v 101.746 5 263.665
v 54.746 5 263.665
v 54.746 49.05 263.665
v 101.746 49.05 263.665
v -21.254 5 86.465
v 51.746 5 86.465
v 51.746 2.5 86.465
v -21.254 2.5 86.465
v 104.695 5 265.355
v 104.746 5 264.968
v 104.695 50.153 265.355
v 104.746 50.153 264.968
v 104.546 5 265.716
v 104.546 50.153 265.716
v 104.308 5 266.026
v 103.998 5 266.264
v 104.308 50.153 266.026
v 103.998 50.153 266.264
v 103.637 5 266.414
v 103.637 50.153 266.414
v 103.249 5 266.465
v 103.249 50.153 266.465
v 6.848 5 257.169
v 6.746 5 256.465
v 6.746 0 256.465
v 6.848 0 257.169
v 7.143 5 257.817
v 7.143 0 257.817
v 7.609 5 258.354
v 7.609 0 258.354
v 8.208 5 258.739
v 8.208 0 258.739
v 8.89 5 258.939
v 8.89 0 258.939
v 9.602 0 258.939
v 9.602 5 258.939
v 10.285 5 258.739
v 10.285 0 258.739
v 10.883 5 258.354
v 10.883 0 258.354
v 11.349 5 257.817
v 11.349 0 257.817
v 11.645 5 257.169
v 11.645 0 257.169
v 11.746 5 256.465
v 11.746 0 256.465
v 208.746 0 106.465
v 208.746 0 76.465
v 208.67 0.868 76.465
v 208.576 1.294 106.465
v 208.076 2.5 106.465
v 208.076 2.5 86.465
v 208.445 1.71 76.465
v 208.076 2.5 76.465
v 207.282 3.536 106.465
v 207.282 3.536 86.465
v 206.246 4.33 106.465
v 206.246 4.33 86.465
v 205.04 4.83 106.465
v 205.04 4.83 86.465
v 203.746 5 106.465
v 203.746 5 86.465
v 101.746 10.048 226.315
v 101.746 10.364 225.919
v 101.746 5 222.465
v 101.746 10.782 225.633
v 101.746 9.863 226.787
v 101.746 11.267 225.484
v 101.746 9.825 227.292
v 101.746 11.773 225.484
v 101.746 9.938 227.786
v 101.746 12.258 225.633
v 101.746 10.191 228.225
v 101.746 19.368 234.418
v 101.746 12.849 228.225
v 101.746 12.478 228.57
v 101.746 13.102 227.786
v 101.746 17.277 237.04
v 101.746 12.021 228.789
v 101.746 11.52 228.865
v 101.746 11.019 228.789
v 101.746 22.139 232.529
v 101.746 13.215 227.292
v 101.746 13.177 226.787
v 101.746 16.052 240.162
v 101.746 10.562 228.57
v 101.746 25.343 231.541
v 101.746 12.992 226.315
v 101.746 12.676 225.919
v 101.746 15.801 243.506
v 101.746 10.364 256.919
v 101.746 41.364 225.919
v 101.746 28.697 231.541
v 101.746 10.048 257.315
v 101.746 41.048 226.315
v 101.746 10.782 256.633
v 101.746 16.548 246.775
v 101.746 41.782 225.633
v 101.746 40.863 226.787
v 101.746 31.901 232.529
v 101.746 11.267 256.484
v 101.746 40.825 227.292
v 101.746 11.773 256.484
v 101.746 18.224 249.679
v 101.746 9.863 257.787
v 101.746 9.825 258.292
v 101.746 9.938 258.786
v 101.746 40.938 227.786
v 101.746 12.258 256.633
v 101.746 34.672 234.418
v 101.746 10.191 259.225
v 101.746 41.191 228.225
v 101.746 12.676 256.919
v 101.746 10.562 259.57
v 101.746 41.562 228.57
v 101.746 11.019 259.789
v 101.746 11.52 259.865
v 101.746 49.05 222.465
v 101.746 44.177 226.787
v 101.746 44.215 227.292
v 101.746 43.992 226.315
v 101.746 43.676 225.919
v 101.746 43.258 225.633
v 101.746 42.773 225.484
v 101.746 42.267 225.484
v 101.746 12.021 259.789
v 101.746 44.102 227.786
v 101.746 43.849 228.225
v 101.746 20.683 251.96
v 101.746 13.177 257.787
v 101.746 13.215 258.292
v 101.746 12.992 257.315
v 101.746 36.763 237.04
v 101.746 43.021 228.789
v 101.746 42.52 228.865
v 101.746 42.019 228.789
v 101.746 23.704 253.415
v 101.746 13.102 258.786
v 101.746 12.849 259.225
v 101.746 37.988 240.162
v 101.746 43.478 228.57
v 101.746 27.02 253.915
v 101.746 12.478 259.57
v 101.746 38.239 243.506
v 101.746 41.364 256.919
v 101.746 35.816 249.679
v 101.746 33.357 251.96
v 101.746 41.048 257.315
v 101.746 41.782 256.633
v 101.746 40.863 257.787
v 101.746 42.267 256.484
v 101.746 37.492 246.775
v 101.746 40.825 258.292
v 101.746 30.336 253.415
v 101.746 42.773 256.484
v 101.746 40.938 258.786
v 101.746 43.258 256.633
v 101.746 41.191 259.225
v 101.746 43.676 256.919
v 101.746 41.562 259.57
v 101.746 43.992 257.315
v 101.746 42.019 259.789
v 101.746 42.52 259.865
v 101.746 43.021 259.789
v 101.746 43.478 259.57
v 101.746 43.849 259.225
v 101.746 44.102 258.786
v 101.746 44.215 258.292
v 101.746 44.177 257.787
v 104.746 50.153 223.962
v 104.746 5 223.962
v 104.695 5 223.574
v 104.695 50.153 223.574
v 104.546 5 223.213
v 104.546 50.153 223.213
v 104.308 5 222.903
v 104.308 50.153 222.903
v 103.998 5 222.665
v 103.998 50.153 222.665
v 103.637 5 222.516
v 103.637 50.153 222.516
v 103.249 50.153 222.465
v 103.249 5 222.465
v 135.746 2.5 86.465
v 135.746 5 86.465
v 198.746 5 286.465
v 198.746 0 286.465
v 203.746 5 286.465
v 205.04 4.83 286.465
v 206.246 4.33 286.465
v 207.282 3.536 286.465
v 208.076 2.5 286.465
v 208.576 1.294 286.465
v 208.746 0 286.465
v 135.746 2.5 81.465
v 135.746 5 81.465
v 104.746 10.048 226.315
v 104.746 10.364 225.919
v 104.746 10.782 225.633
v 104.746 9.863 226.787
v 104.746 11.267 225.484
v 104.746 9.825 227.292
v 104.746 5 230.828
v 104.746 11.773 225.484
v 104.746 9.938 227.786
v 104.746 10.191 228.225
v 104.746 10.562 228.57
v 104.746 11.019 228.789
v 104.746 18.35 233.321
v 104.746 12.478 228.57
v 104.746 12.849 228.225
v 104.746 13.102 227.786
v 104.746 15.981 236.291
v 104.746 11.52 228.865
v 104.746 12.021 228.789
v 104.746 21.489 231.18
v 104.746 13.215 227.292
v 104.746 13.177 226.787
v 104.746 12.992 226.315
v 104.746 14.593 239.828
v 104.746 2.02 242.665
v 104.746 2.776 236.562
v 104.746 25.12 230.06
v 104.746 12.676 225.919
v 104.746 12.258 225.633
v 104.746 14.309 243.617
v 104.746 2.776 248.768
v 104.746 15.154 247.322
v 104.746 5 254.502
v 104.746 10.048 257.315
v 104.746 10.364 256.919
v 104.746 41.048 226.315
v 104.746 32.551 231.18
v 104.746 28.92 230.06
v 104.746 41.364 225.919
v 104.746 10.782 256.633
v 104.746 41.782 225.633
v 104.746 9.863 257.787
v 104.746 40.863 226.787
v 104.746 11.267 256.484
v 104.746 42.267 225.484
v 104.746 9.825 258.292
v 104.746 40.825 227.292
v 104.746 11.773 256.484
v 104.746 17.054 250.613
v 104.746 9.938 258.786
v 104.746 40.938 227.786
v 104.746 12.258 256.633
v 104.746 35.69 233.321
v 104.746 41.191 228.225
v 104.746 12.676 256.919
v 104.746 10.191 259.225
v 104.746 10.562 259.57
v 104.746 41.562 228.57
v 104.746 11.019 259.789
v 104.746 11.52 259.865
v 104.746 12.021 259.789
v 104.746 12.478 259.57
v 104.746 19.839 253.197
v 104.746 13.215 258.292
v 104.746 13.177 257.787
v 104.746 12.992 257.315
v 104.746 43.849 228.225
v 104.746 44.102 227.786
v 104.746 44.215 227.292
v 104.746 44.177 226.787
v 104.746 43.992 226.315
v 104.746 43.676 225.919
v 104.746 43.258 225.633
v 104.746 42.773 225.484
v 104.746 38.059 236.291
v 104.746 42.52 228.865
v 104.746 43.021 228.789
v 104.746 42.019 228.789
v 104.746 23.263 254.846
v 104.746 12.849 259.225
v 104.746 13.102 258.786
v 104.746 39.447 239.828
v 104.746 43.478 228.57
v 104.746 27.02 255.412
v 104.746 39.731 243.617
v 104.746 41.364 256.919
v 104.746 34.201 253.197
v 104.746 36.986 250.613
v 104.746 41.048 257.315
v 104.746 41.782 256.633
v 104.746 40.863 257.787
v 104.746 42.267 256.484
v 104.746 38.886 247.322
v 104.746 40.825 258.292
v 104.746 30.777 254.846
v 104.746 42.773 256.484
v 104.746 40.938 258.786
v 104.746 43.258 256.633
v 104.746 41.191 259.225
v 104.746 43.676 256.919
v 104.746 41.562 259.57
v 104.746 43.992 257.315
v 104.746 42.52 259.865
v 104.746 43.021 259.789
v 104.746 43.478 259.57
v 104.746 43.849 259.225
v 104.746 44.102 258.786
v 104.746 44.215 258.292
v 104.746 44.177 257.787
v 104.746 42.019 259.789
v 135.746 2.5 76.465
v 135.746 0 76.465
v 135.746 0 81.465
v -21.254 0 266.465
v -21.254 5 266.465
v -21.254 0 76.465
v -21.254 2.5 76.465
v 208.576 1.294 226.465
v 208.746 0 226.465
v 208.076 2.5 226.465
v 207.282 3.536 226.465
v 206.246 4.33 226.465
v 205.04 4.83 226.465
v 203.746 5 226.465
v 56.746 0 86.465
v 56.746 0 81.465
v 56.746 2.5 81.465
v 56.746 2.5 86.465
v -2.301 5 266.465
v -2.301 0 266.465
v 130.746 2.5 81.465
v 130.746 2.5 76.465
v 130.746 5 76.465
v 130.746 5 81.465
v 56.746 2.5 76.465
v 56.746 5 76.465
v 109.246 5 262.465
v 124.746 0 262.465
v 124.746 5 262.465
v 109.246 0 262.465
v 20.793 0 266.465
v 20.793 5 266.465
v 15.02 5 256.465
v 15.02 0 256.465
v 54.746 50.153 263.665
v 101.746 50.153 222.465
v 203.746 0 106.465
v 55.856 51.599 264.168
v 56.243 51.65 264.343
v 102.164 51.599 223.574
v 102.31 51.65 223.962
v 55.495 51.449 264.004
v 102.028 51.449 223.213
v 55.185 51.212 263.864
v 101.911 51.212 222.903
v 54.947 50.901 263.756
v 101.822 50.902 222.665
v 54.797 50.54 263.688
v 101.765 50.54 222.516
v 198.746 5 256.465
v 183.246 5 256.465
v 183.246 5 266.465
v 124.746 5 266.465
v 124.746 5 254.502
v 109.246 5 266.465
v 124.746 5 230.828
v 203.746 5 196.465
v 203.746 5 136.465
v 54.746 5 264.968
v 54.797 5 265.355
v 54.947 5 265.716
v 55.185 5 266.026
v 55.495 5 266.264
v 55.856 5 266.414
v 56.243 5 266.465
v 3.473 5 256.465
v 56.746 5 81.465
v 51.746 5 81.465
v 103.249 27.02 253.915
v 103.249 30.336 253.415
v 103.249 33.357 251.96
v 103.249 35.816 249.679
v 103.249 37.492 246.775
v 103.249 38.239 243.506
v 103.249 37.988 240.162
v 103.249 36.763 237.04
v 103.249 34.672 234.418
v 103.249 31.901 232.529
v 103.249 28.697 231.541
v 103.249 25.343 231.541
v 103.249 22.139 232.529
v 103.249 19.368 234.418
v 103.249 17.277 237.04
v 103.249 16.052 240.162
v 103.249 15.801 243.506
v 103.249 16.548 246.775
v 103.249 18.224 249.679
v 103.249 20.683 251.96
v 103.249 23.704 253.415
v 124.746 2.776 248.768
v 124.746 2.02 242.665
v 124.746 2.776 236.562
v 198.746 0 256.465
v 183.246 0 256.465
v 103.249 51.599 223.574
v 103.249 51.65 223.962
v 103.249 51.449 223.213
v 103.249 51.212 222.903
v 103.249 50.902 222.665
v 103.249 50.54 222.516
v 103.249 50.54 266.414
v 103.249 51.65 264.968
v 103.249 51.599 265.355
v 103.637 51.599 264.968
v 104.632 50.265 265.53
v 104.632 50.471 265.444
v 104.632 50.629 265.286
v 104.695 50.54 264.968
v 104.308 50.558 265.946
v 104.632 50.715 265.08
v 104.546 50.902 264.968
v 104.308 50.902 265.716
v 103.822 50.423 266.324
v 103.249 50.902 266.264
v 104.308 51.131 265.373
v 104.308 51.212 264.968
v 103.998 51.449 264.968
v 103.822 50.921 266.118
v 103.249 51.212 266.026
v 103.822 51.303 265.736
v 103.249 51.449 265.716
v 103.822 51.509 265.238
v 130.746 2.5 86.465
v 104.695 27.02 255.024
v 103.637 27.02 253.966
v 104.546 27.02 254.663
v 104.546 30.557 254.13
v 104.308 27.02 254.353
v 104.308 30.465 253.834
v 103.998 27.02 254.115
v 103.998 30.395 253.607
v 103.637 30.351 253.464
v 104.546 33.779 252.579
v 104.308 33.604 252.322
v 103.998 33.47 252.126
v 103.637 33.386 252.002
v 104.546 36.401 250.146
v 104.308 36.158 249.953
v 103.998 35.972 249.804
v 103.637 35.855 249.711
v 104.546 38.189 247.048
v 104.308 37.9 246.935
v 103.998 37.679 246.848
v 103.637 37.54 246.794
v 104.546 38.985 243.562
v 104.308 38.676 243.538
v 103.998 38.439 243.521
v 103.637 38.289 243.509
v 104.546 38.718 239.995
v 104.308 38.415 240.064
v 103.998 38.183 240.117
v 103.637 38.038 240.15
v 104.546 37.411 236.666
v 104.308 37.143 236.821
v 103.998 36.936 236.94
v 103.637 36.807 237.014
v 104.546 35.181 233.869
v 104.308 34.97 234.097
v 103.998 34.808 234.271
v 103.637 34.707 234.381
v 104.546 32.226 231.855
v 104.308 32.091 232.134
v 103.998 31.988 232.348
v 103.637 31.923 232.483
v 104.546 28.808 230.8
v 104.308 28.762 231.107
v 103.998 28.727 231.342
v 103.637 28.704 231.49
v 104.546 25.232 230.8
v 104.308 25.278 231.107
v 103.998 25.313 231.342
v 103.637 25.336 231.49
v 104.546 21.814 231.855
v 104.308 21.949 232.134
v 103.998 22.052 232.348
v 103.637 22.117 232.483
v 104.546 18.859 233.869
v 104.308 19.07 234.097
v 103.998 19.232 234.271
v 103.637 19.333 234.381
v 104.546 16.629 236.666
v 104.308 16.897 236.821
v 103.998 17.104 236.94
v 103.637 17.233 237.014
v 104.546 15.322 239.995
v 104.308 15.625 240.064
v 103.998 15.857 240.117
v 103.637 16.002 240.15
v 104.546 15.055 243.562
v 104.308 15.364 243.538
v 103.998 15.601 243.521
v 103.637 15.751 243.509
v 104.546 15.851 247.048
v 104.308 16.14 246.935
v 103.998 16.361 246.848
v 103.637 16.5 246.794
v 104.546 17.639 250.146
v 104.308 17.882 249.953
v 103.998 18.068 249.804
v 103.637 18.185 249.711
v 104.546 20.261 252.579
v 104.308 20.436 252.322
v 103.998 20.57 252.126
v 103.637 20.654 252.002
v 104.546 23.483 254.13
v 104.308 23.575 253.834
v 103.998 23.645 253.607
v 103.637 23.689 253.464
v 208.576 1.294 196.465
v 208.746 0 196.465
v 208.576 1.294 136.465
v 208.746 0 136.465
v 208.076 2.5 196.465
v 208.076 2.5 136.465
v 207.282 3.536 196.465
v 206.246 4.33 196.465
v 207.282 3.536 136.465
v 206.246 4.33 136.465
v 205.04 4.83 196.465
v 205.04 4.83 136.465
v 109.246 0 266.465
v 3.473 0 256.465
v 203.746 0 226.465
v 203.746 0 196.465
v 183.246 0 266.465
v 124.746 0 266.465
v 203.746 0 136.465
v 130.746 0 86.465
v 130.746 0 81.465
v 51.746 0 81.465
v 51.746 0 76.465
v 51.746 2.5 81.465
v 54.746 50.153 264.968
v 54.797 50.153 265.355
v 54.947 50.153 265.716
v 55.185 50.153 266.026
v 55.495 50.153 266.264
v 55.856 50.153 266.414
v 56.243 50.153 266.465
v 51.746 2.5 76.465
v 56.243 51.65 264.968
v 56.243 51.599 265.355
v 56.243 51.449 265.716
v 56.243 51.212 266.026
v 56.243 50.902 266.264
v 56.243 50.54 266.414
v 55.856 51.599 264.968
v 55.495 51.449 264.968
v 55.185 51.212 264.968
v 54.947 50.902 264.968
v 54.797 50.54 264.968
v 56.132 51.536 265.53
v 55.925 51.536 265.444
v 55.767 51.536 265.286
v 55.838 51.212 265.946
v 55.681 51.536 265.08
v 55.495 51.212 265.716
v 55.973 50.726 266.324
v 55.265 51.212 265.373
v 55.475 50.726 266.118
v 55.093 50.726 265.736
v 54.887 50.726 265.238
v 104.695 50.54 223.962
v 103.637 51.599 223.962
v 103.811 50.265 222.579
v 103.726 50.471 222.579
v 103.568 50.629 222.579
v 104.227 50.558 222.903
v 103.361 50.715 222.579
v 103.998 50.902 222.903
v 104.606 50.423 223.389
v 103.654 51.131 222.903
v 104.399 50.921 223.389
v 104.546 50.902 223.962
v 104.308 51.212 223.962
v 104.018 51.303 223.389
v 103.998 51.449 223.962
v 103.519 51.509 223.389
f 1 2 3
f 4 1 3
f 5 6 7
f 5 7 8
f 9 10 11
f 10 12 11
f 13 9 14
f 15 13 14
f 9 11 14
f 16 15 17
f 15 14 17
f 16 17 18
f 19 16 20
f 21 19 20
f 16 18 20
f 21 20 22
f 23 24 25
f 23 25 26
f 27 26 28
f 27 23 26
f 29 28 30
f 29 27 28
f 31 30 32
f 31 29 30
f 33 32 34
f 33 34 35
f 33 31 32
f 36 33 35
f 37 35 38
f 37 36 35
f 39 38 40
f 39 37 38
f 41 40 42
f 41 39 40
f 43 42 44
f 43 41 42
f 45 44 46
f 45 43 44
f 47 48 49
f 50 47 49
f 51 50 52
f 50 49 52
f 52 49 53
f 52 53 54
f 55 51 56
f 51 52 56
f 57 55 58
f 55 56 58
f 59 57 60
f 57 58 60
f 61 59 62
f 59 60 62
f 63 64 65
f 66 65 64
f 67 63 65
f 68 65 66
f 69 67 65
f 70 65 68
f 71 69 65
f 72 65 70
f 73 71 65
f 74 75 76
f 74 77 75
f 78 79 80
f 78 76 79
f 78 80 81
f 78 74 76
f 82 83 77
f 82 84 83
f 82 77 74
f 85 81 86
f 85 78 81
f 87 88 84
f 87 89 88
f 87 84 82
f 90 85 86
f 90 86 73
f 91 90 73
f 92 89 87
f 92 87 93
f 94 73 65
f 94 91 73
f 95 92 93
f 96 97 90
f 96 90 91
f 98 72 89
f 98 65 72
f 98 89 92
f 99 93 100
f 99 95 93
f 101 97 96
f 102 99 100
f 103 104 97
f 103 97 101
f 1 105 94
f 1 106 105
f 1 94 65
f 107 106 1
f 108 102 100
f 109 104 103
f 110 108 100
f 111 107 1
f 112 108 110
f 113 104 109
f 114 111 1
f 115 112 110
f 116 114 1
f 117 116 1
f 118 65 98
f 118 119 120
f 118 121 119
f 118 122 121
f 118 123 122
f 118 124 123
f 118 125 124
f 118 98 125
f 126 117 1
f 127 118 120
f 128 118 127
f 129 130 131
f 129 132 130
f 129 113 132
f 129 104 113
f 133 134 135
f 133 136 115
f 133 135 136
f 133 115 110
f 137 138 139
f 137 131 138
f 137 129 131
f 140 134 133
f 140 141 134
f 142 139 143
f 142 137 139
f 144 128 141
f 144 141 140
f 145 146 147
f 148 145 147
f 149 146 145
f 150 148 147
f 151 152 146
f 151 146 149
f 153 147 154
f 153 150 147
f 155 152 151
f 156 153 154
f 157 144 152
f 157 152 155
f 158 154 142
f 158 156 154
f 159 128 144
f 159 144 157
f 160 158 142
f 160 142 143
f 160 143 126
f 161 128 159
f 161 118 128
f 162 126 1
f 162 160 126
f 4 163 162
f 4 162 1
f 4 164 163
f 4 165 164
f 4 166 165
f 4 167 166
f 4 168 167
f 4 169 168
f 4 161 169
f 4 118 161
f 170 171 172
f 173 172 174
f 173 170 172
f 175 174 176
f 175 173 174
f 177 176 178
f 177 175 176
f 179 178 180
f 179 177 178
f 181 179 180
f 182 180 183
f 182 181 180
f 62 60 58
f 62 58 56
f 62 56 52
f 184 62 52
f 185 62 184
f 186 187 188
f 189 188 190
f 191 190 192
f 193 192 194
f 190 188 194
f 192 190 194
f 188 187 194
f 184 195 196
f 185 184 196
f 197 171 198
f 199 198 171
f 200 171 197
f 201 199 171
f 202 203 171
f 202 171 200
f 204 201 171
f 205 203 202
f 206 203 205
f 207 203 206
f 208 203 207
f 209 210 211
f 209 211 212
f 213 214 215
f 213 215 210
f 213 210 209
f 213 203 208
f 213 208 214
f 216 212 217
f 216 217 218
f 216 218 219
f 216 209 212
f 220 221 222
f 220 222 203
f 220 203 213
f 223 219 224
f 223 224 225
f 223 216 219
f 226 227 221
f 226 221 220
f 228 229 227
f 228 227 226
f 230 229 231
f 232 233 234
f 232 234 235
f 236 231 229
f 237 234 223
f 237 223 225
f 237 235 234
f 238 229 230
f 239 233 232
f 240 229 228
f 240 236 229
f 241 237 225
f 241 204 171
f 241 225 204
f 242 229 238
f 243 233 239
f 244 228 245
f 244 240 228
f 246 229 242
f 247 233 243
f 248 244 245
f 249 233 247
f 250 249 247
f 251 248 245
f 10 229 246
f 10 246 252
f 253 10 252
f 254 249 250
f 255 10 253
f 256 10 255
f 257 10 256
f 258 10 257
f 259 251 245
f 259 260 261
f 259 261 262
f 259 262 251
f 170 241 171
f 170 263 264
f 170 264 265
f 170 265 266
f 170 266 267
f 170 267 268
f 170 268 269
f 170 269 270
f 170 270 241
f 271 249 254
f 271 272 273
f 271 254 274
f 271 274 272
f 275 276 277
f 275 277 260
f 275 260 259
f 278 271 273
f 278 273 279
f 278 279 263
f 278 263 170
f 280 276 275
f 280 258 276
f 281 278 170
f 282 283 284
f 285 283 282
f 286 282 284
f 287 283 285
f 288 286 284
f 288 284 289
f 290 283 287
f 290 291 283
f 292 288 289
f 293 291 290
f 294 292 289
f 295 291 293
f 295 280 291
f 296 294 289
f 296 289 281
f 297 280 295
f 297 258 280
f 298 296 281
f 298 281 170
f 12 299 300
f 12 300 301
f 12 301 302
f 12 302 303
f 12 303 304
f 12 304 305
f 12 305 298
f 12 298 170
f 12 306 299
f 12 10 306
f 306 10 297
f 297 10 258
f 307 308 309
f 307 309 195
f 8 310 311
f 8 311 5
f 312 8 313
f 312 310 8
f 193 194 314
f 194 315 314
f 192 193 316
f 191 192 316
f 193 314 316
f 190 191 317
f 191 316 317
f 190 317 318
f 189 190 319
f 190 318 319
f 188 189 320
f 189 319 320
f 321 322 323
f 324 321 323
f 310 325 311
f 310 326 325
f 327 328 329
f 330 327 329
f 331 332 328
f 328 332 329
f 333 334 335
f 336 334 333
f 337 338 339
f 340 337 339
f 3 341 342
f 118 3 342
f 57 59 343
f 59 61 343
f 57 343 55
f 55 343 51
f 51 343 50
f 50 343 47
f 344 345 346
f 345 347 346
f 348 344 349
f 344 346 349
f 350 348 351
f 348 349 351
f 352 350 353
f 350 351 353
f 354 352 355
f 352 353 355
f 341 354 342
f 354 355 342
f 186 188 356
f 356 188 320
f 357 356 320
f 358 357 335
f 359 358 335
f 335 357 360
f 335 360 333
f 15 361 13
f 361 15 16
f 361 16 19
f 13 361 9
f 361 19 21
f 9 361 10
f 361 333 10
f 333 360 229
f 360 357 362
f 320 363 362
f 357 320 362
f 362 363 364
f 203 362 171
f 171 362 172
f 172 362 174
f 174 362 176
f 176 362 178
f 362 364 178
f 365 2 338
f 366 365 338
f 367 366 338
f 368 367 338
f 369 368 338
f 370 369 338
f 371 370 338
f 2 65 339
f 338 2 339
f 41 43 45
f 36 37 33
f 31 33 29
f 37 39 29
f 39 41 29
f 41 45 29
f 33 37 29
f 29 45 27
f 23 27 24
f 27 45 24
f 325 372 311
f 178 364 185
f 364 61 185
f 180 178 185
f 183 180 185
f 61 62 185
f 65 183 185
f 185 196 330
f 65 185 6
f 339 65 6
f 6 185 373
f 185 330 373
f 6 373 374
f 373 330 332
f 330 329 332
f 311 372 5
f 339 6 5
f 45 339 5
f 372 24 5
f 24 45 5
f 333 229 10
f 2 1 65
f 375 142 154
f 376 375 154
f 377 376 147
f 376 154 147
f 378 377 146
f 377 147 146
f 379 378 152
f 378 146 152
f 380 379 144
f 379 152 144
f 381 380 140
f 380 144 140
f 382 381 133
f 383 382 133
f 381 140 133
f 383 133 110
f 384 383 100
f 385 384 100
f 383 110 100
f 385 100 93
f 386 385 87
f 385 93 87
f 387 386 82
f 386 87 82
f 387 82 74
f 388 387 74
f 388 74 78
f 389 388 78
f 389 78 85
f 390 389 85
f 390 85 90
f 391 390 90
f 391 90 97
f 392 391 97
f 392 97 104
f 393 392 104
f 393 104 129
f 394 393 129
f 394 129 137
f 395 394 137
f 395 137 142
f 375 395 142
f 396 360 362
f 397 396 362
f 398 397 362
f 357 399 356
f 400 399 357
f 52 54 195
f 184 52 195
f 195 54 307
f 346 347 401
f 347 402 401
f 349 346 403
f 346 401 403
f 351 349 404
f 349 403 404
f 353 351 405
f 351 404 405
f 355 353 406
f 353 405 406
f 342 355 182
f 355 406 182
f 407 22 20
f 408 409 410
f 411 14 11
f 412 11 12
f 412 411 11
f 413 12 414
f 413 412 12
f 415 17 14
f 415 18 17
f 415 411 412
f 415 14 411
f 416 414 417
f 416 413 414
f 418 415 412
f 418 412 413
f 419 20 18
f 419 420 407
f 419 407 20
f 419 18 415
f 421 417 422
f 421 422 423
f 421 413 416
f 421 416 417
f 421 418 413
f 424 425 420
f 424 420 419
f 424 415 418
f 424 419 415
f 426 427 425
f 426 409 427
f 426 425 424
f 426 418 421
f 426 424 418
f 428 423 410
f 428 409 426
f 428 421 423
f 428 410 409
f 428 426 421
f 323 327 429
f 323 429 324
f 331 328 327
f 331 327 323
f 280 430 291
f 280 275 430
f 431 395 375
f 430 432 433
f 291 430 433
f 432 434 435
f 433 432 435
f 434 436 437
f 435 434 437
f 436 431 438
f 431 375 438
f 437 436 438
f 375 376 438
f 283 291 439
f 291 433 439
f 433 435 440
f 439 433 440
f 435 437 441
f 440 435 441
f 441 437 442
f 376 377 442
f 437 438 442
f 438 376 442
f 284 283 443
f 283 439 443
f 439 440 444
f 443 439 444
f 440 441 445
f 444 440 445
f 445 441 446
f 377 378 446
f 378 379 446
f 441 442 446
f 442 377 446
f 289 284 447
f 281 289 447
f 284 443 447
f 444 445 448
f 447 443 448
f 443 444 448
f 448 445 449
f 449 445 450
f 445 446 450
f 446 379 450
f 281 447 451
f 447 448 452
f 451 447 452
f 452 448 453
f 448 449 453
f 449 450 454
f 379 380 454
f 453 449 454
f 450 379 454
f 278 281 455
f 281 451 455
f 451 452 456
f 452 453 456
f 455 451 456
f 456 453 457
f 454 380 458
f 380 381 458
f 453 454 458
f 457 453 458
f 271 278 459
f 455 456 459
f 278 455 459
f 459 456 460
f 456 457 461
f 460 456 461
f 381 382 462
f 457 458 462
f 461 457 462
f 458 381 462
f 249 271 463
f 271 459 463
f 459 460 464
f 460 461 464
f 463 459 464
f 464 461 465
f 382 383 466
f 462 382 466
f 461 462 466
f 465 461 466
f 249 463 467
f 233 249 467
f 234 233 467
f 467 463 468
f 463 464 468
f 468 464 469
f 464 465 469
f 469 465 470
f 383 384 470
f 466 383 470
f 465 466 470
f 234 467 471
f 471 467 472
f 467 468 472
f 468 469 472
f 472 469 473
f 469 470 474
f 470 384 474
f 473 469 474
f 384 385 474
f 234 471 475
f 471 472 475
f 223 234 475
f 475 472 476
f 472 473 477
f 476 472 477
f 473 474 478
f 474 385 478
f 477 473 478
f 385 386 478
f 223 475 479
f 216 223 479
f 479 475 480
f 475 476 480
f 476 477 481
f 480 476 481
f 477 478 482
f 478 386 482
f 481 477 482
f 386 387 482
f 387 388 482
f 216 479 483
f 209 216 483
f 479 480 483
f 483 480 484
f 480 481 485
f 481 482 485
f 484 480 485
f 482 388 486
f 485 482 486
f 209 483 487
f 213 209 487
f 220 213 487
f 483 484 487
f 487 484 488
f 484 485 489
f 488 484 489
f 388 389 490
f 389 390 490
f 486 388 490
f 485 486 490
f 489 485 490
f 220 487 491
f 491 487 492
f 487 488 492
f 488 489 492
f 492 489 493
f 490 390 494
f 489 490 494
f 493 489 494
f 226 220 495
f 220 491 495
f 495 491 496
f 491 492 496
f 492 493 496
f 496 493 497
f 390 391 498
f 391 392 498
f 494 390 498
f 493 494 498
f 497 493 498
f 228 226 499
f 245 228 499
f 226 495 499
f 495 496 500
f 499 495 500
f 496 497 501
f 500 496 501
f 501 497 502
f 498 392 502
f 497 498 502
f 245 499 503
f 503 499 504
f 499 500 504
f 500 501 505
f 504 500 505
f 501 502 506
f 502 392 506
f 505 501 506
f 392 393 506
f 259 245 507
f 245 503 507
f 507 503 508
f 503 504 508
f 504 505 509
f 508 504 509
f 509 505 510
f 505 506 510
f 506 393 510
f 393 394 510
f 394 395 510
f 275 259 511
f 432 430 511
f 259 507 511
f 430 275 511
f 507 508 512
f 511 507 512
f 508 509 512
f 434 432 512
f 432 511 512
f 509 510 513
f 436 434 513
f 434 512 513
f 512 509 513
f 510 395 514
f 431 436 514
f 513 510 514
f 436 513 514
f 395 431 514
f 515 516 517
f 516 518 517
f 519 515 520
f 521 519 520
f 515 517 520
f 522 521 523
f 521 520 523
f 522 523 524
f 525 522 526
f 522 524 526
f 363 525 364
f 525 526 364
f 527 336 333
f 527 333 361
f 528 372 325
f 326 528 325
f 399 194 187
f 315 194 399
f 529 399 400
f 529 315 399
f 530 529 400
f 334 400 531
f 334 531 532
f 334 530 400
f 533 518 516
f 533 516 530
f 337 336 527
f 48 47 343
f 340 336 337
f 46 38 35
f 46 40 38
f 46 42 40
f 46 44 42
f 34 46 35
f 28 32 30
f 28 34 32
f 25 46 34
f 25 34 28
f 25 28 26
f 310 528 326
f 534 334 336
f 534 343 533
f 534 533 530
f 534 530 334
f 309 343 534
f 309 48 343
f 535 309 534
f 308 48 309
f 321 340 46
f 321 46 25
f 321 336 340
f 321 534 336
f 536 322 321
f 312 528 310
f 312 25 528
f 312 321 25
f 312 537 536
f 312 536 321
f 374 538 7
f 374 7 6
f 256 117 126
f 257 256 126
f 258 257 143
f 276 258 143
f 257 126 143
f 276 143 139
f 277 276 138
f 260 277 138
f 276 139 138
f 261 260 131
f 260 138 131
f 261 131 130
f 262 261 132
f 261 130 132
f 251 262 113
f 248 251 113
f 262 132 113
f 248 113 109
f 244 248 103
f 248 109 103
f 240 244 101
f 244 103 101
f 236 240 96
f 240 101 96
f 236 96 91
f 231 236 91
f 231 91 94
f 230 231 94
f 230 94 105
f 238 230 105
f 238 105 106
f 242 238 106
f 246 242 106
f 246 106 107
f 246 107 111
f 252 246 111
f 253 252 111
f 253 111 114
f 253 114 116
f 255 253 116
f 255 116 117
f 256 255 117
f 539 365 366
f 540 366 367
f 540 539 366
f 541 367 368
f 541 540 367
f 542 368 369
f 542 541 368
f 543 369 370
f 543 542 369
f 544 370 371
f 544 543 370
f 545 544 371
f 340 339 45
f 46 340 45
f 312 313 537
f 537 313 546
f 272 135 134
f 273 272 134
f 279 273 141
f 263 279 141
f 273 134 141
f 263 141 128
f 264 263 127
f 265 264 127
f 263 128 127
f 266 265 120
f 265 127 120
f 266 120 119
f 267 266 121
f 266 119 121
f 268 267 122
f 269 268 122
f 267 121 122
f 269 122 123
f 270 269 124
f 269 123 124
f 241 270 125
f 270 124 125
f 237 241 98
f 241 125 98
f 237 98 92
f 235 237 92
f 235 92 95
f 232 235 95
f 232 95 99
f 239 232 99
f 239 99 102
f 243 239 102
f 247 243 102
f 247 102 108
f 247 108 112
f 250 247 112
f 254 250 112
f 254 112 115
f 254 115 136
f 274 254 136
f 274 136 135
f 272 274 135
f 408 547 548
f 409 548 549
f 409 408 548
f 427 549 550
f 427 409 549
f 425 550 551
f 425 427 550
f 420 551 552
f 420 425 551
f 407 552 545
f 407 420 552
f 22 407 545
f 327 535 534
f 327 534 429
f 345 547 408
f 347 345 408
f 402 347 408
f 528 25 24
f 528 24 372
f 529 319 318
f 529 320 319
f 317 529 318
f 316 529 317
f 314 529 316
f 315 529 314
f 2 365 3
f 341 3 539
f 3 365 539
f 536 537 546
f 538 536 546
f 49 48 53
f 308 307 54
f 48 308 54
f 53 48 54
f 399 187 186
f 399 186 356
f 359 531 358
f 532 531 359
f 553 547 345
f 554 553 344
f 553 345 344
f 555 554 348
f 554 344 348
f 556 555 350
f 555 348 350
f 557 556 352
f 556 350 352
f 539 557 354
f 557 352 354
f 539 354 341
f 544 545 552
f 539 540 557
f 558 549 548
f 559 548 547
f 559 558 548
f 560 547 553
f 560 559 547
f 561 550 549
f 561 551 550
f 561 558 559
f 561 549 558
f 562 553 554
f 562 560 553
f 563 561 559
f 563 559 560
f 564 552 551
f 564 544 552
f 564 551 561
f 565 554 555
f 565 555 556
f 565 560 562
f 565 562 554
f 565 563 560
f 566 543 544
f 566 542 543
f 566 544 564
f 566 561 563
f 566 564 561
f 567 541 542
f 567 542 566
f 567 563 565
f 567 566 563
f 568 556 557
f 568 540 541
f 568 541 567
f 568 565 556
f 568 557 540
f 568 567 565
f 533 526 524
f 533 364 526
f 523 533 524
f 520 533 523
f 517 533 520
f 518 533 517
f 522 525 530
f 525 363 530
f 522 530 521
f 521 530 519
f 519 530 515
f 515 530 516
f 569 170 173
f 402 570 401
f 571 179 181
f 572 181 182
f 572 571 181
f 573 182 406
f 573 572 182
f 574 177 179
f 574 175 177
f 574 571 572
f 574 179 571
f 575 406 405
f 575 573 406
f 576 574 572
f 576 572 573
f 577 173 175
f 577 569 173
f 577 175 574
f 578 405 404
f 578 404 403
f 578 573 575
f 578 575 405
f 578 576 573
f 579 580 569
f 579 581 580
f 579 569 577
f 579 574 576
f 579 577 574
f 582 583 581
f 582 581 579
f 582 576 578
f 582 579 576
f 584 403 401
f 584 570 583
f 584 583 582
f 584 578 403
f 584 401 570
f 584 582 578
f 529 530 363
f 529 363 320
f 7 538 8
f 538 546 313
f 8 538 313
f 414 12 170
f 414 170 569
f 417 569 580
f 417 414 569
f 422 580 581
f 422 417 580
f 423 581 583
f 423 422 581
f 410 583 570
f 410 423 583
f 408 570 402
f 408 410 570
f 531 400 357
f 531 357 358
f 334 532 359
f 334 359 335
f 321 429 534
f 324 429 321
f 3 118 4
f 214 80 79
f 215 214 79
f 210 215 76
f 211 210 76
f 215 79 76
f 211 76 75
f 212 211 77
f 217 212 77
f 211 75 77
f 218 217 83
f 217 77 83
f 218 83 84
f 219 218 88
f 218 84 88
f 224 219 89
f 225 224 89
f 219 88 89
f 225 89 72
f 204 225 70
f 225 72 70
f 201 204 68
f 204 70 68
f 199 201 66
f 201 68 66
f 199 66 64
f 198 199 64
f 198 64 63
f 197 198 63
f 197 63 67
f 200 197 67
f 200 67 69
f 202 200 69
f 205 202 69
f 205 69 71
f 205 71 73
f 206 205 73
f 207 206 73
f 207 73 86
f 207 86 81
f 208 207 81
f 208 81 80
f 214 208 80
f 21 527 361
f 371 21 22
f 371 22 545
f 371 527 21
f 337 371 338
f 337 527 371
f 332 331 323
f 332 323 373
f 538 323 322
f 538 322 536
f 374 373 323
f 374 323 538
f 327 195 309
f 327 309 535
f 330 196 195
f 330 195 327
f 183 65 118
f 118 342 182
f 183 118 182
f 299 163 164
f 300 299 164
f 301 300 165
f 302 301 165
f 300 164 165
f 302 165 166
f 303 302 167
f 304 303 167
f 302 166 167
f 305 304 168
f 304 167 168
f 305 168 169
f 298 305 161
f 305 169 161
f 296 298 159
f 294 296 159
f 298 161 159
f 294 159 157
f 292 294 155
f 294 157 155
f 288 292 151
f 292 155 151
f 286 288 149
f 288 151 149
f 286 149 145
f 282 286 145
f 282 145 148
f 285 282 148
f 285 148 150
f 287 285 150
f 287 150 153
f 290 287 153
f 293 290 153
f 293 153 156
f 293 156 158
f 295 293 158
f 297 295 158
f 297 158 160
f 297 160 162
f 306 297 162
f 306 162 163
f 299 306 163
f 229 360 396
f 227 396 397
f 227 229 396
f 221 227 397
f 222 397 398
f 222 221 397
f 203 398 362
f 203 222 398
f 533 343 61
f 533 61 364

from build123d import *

# Parameters (mm, degrees)
SKETCH_1_W           = 5
SKETCH_1_H           = 60
SKETCH_1_W_2         = 30
SKETCH_1_H_2         = 5
SKETCH_1_W_3         = 15
EXTRUDE_1_DEPTH      = 5
FILLET_1_R           = 5
SKETCH_2_W           = 245
SKETCH_2_H           = 125
CUT_EXTRUDE_1_DEPTH  = 5
SKETCH_3_W           = 74
SKETCH_3_H           = 2.5
SKETCH_3_W_2         = 73
CUT_EXTRUDE_2_DEPTH  = 10
SKETCH_4_W           = 5
SKETCH_4_H           = 5
CUT_EXTRUDE_3_DEPTH  = 5
SKETCH_5_W           = 50
SKETCH_5_H           = 46.65
EXTRUDE_2_DEPTH      = 47
SKETCH_6_W           = 41.4
SKETCH_6_H           = 44.05
CUT_EXTRUDE_4_DEPTH  = 47
SKETCH_7_R           = 11.25
CUT_EXTRUDE_5_DEPTH  = 317.004529962
CUT_EXTRUDE_6_DEPTH  = 46.65
SKETCH_10_R          = 1.7
CUT_EXTRUDE_7_DEPTH  = 317.004529962
SKETCH_13_R          = 25
CUT_EXTRUDE_9_DEPTH  = 20
FILLET_11_R          = 1.497
CUT_EXTRUDE_10_DEPTH = 358.50996514
SKETCH_17_R          = 2.5
EXTRUDE_3_DEPTH      = 5


with BuildPart() as part:
    # 草圖1 → 填料-伸長1 (new body)
    with BuildSketch(Plane(origin=(0, 0, 0), x_dir=(1, 0, 0), z_dir=(0, 1, 0))):
        Polygon((198.746286718, -286.464902661), (198.746286718, -256.464902661), (183.246286718, -256.464902661), (183.246286718, -266.464902661), (124.746286718, -266.464902661), (124.746286718, -262.464902661), (109.246286718, -262.464902661), (109.246286718, -266.464902661), (-21.253713282, -266.464902661), (-21.253713282, 38.535097339), (-36.253713282, 38.535097339), (-36.253713282, 43.535097339), (203.746286718, 43.535097339), (203.746286718, -286.464902661), align=None)
        with Locations((206.246286718, -256.464902661)):
            Rectangle(SKETCH_1_W, SKETCH_1_H)
        with Locations((206.246286718, 13.535097339)):
            Rectangle(SKETCH_1_W, SKETCH_1_H)
        with Locations((188.746286718, 46.035097339)):
            Rectangle(SKETCH_1_W_2, SKETCH_1_H_2)
        with Locations((-21.253713282, 46.035097339)):
            Rectangle(SKETCH_1_W_2, SKETCH_1_H_2)
        with Locations((91.246286718, 46.035097339)):
            Rectangle(SKETCH_1_W_3, SKETCH_1_H_2)
        with Locations((76.246286718, 46.035097339)):
            Rectangle(SKETCH_1_W_3, SKETCH_1_H_2)
        with Locations((206.246286718, -166.464902661)):
            Rectangle(SKETCH_1_W, SKETCH_1_H)
        with Locations((206.246286718, -76.464902661)):
            Rectangle(SKETCH_1_W, SKETCH_1_H)
    extrude(amount=EXTRUDE_1_DEPTH)

    # 圓角1
    fillet_1_edges = [part.edges().sort_by_distance(p)[0] for p in [
        (208.746286718, 5, -13.535097339),
        (208.746286718, 5, 76.464902661),
        (208.746286718, 5, 166.464902661),
        (208.746286718, 5, 256.464902661),
    ]]
    fillet(fillet_1_edges, radius=FILLET_1_R - 0.0001)  # a hair under: the kernel refuses the full size

    # 草圖2 → 除料-伸長1 (cut)
    with BuildSketch(Plane(origin=(0, 5, 0), x_dir=(1, 0, 0), z_dir=(0, 1, 0))):
        with Locations((86.246286718, -13.964902661)):
            Rectangle(SKETCH_2_W, SKETCH_2_H)
    extrude(amount=-CUT_EXTRUDE_1_DEPTH, mode=Mode.SUBTRACT)

    # 草圖3 → 除料-伸長2 (cut)
    with BuildSketch(Plane(origin=(0, 0, 76.464902661), x_dir=(-1, 0, 0), z_dir=(0, 0, -1))):
        with Locations((-93.746286718, 1.25)):
            Rectangle(SKETCH_3_W, SKETCH_3_H)
        with Locations((-172.246286718, 3.75)):
            Rectangle(SKETCH_3_W_2, SKETCH_3_H)
        with Locations((-15.246286718, 3.75)):
            Rectangle(SKETCH_3_W_2, SKETCH_3_H)
    extrude(amount=-CUT_EXTRUDE_2_DEPTH, mode=Mode.SUBTRACT)

    # 草圖4 → 除料-伸長3 (cut)
    with BuildSketch(Plane(origin=(0, 0, 76.464902661), x_dir=(-1, 0, 0), z_dir=(0, 0, -1))):
        with Locations((-133.246286718, 2.5)):
            Rectangle(SKETCH_4_W, SKETCH_4_H)
        with Locations((-54.246286718, 2.5)):
            Rectangle(SKETCH_4_W, SKETCH_4_H)
    extrude(amount=-CUT_EXTRUDE_3_DEPTH, mode=Mode.SUBTRACT)

    # 草圖5 → 填料-伸長2 (add)
    with BuildSketch(Plane.XY.offset(266.464902661)):
        with Locations((79.746286718, 28.325)):
            Rectangle(SKETCH_5_W, SKETCH_5_H)
    extrude(amount=-EXTRUDE_2_DEPTH)

    # 草圖6 → 除料-伸長4 (cut)
    with BuildSketch(Plane.ZY.offset(-54.746286718)):
        with Locations((242.964902661, 27.025)):
            Rectangle(SKETCH_6_W, SKETCH_6_H)
    extrude(amount=-CUT_EXTRUDE_4_DEPTH, mode=Mode.SUBTRACT)

    # 草圖7 → 除料-伸長5 (cut, through all)
    with BuildSketch(Plane.ZY.offset(-101.746286718)):
        with Locations((242.664902661, 27.02)):
            Circle(SKETCH_7_R)
    extrude(amount=-CUT_EXTRUDE_5_DEPTH, mode=Mode.SUBTRACT)

    # 草圖8 → 除料-伸長6 (cut)
    with BuildSketch(Plane(origin=(0, 51.65, 0), x_dir=(1, 0, 0), z_dir=(0, 1, 0))):
        Polygon((54.746286718, -263.664902661), (101.746286718, -222.464902661), (104.746286718, -222.464902661), (104.746286718, -219.464902661), (54.746286718, -219.464902661), align=None)
    extrude(amount=-CUT_EXTRUDE_6_DEPTH, mode=Mode.SUBTRACT)

    # 草圖10 → 除料-伸長7 (cut, through all)
    with BuildSketch(Plane.ZY.offset(-101.746286718)):
        with Locations((227.164902661, 42.52)):
            Circle(SKETCH_10_R)
        with Locations((258.164902661, 42.52)):
            Circle(SKETCH_10_R)
        with Locations((258.164902661, 11.52)):
            Circle(SKETCH_10_R)
        with Locations((227.164902661, 11.52)):
            Circle(SKETCH_10_R)
    extrude(amount=-CUT_EXTRUDE_7_DEPTH, mode=Mode.SUBTRACT)

    # 草圖13 → 除料-伸長9 (cut)
    with BuildSketch(Plane(origin=(104.746286718, 0, 0), x_dir=(0, 0, -1), z_dir=(1, 0, 0))):
        with Locations((-242.664902661, 27.02)):
            Circle(SKETCH_13_R)
    extrude(amount=CUT_EXTRUDE_9_DEPTH, mode=Mode.SUBTRACT)

    # 圓角11
    fillet_11_edges = [part.edges().sort_by_distance(p)[0] for p in [
        (54.746286718, 28.325, 266.464902661),
        (79.746286718, 51.65, 266.464902661),
        (104.746286718, 28.325, 266.464902661),
        (104.746286718, 27.02, 231.414902661),
        (54.746286718, 51.65, 265.064902661),
        (104.746286718, 51.65, 244.464902661),
        (104.746286718, 28.325, 222.464902661),
        (78.246286718, 51.65, 243.064902661),
        (103.246286718, 51.65, 222.464902661),
    ]]
    fillet(fillet_11_edges, radius=FILLET_11_R)

    # 草圖14 → 除料-伸長10 (cut, through all)
    with BuildSketch(Plane(origin=(0, 5, 0), x_dir=(1, 0, 0), z_dir=(0, 1, 0))):
        Polygon((20.793292101, -266.464902661), (15.019789409, -256.464902661), (3.472784026, -256.464902661), (-2.300718666, -266.464902661), (3.472784026, -276.464902661), (15.019789409, -276.464902661), align=None)
    extrude(amount=-CUT_EXTRUDE_10_DEPTH, mode=Mode.SUBTRACT)

    # 草圖17 → 填料-伸長3 (add)
    with BuildSketch(Plane(origin=(0, 5, 0), x_dir=(1, 0, 0), z_dir=(0, 1, 0))):
        with Locations((9.246286718, -256.464902661)):
            Circle(SKETCH_17_R)
    extrude(amount=-EXTRUDE_3_DEPTH)


solid = part.part
